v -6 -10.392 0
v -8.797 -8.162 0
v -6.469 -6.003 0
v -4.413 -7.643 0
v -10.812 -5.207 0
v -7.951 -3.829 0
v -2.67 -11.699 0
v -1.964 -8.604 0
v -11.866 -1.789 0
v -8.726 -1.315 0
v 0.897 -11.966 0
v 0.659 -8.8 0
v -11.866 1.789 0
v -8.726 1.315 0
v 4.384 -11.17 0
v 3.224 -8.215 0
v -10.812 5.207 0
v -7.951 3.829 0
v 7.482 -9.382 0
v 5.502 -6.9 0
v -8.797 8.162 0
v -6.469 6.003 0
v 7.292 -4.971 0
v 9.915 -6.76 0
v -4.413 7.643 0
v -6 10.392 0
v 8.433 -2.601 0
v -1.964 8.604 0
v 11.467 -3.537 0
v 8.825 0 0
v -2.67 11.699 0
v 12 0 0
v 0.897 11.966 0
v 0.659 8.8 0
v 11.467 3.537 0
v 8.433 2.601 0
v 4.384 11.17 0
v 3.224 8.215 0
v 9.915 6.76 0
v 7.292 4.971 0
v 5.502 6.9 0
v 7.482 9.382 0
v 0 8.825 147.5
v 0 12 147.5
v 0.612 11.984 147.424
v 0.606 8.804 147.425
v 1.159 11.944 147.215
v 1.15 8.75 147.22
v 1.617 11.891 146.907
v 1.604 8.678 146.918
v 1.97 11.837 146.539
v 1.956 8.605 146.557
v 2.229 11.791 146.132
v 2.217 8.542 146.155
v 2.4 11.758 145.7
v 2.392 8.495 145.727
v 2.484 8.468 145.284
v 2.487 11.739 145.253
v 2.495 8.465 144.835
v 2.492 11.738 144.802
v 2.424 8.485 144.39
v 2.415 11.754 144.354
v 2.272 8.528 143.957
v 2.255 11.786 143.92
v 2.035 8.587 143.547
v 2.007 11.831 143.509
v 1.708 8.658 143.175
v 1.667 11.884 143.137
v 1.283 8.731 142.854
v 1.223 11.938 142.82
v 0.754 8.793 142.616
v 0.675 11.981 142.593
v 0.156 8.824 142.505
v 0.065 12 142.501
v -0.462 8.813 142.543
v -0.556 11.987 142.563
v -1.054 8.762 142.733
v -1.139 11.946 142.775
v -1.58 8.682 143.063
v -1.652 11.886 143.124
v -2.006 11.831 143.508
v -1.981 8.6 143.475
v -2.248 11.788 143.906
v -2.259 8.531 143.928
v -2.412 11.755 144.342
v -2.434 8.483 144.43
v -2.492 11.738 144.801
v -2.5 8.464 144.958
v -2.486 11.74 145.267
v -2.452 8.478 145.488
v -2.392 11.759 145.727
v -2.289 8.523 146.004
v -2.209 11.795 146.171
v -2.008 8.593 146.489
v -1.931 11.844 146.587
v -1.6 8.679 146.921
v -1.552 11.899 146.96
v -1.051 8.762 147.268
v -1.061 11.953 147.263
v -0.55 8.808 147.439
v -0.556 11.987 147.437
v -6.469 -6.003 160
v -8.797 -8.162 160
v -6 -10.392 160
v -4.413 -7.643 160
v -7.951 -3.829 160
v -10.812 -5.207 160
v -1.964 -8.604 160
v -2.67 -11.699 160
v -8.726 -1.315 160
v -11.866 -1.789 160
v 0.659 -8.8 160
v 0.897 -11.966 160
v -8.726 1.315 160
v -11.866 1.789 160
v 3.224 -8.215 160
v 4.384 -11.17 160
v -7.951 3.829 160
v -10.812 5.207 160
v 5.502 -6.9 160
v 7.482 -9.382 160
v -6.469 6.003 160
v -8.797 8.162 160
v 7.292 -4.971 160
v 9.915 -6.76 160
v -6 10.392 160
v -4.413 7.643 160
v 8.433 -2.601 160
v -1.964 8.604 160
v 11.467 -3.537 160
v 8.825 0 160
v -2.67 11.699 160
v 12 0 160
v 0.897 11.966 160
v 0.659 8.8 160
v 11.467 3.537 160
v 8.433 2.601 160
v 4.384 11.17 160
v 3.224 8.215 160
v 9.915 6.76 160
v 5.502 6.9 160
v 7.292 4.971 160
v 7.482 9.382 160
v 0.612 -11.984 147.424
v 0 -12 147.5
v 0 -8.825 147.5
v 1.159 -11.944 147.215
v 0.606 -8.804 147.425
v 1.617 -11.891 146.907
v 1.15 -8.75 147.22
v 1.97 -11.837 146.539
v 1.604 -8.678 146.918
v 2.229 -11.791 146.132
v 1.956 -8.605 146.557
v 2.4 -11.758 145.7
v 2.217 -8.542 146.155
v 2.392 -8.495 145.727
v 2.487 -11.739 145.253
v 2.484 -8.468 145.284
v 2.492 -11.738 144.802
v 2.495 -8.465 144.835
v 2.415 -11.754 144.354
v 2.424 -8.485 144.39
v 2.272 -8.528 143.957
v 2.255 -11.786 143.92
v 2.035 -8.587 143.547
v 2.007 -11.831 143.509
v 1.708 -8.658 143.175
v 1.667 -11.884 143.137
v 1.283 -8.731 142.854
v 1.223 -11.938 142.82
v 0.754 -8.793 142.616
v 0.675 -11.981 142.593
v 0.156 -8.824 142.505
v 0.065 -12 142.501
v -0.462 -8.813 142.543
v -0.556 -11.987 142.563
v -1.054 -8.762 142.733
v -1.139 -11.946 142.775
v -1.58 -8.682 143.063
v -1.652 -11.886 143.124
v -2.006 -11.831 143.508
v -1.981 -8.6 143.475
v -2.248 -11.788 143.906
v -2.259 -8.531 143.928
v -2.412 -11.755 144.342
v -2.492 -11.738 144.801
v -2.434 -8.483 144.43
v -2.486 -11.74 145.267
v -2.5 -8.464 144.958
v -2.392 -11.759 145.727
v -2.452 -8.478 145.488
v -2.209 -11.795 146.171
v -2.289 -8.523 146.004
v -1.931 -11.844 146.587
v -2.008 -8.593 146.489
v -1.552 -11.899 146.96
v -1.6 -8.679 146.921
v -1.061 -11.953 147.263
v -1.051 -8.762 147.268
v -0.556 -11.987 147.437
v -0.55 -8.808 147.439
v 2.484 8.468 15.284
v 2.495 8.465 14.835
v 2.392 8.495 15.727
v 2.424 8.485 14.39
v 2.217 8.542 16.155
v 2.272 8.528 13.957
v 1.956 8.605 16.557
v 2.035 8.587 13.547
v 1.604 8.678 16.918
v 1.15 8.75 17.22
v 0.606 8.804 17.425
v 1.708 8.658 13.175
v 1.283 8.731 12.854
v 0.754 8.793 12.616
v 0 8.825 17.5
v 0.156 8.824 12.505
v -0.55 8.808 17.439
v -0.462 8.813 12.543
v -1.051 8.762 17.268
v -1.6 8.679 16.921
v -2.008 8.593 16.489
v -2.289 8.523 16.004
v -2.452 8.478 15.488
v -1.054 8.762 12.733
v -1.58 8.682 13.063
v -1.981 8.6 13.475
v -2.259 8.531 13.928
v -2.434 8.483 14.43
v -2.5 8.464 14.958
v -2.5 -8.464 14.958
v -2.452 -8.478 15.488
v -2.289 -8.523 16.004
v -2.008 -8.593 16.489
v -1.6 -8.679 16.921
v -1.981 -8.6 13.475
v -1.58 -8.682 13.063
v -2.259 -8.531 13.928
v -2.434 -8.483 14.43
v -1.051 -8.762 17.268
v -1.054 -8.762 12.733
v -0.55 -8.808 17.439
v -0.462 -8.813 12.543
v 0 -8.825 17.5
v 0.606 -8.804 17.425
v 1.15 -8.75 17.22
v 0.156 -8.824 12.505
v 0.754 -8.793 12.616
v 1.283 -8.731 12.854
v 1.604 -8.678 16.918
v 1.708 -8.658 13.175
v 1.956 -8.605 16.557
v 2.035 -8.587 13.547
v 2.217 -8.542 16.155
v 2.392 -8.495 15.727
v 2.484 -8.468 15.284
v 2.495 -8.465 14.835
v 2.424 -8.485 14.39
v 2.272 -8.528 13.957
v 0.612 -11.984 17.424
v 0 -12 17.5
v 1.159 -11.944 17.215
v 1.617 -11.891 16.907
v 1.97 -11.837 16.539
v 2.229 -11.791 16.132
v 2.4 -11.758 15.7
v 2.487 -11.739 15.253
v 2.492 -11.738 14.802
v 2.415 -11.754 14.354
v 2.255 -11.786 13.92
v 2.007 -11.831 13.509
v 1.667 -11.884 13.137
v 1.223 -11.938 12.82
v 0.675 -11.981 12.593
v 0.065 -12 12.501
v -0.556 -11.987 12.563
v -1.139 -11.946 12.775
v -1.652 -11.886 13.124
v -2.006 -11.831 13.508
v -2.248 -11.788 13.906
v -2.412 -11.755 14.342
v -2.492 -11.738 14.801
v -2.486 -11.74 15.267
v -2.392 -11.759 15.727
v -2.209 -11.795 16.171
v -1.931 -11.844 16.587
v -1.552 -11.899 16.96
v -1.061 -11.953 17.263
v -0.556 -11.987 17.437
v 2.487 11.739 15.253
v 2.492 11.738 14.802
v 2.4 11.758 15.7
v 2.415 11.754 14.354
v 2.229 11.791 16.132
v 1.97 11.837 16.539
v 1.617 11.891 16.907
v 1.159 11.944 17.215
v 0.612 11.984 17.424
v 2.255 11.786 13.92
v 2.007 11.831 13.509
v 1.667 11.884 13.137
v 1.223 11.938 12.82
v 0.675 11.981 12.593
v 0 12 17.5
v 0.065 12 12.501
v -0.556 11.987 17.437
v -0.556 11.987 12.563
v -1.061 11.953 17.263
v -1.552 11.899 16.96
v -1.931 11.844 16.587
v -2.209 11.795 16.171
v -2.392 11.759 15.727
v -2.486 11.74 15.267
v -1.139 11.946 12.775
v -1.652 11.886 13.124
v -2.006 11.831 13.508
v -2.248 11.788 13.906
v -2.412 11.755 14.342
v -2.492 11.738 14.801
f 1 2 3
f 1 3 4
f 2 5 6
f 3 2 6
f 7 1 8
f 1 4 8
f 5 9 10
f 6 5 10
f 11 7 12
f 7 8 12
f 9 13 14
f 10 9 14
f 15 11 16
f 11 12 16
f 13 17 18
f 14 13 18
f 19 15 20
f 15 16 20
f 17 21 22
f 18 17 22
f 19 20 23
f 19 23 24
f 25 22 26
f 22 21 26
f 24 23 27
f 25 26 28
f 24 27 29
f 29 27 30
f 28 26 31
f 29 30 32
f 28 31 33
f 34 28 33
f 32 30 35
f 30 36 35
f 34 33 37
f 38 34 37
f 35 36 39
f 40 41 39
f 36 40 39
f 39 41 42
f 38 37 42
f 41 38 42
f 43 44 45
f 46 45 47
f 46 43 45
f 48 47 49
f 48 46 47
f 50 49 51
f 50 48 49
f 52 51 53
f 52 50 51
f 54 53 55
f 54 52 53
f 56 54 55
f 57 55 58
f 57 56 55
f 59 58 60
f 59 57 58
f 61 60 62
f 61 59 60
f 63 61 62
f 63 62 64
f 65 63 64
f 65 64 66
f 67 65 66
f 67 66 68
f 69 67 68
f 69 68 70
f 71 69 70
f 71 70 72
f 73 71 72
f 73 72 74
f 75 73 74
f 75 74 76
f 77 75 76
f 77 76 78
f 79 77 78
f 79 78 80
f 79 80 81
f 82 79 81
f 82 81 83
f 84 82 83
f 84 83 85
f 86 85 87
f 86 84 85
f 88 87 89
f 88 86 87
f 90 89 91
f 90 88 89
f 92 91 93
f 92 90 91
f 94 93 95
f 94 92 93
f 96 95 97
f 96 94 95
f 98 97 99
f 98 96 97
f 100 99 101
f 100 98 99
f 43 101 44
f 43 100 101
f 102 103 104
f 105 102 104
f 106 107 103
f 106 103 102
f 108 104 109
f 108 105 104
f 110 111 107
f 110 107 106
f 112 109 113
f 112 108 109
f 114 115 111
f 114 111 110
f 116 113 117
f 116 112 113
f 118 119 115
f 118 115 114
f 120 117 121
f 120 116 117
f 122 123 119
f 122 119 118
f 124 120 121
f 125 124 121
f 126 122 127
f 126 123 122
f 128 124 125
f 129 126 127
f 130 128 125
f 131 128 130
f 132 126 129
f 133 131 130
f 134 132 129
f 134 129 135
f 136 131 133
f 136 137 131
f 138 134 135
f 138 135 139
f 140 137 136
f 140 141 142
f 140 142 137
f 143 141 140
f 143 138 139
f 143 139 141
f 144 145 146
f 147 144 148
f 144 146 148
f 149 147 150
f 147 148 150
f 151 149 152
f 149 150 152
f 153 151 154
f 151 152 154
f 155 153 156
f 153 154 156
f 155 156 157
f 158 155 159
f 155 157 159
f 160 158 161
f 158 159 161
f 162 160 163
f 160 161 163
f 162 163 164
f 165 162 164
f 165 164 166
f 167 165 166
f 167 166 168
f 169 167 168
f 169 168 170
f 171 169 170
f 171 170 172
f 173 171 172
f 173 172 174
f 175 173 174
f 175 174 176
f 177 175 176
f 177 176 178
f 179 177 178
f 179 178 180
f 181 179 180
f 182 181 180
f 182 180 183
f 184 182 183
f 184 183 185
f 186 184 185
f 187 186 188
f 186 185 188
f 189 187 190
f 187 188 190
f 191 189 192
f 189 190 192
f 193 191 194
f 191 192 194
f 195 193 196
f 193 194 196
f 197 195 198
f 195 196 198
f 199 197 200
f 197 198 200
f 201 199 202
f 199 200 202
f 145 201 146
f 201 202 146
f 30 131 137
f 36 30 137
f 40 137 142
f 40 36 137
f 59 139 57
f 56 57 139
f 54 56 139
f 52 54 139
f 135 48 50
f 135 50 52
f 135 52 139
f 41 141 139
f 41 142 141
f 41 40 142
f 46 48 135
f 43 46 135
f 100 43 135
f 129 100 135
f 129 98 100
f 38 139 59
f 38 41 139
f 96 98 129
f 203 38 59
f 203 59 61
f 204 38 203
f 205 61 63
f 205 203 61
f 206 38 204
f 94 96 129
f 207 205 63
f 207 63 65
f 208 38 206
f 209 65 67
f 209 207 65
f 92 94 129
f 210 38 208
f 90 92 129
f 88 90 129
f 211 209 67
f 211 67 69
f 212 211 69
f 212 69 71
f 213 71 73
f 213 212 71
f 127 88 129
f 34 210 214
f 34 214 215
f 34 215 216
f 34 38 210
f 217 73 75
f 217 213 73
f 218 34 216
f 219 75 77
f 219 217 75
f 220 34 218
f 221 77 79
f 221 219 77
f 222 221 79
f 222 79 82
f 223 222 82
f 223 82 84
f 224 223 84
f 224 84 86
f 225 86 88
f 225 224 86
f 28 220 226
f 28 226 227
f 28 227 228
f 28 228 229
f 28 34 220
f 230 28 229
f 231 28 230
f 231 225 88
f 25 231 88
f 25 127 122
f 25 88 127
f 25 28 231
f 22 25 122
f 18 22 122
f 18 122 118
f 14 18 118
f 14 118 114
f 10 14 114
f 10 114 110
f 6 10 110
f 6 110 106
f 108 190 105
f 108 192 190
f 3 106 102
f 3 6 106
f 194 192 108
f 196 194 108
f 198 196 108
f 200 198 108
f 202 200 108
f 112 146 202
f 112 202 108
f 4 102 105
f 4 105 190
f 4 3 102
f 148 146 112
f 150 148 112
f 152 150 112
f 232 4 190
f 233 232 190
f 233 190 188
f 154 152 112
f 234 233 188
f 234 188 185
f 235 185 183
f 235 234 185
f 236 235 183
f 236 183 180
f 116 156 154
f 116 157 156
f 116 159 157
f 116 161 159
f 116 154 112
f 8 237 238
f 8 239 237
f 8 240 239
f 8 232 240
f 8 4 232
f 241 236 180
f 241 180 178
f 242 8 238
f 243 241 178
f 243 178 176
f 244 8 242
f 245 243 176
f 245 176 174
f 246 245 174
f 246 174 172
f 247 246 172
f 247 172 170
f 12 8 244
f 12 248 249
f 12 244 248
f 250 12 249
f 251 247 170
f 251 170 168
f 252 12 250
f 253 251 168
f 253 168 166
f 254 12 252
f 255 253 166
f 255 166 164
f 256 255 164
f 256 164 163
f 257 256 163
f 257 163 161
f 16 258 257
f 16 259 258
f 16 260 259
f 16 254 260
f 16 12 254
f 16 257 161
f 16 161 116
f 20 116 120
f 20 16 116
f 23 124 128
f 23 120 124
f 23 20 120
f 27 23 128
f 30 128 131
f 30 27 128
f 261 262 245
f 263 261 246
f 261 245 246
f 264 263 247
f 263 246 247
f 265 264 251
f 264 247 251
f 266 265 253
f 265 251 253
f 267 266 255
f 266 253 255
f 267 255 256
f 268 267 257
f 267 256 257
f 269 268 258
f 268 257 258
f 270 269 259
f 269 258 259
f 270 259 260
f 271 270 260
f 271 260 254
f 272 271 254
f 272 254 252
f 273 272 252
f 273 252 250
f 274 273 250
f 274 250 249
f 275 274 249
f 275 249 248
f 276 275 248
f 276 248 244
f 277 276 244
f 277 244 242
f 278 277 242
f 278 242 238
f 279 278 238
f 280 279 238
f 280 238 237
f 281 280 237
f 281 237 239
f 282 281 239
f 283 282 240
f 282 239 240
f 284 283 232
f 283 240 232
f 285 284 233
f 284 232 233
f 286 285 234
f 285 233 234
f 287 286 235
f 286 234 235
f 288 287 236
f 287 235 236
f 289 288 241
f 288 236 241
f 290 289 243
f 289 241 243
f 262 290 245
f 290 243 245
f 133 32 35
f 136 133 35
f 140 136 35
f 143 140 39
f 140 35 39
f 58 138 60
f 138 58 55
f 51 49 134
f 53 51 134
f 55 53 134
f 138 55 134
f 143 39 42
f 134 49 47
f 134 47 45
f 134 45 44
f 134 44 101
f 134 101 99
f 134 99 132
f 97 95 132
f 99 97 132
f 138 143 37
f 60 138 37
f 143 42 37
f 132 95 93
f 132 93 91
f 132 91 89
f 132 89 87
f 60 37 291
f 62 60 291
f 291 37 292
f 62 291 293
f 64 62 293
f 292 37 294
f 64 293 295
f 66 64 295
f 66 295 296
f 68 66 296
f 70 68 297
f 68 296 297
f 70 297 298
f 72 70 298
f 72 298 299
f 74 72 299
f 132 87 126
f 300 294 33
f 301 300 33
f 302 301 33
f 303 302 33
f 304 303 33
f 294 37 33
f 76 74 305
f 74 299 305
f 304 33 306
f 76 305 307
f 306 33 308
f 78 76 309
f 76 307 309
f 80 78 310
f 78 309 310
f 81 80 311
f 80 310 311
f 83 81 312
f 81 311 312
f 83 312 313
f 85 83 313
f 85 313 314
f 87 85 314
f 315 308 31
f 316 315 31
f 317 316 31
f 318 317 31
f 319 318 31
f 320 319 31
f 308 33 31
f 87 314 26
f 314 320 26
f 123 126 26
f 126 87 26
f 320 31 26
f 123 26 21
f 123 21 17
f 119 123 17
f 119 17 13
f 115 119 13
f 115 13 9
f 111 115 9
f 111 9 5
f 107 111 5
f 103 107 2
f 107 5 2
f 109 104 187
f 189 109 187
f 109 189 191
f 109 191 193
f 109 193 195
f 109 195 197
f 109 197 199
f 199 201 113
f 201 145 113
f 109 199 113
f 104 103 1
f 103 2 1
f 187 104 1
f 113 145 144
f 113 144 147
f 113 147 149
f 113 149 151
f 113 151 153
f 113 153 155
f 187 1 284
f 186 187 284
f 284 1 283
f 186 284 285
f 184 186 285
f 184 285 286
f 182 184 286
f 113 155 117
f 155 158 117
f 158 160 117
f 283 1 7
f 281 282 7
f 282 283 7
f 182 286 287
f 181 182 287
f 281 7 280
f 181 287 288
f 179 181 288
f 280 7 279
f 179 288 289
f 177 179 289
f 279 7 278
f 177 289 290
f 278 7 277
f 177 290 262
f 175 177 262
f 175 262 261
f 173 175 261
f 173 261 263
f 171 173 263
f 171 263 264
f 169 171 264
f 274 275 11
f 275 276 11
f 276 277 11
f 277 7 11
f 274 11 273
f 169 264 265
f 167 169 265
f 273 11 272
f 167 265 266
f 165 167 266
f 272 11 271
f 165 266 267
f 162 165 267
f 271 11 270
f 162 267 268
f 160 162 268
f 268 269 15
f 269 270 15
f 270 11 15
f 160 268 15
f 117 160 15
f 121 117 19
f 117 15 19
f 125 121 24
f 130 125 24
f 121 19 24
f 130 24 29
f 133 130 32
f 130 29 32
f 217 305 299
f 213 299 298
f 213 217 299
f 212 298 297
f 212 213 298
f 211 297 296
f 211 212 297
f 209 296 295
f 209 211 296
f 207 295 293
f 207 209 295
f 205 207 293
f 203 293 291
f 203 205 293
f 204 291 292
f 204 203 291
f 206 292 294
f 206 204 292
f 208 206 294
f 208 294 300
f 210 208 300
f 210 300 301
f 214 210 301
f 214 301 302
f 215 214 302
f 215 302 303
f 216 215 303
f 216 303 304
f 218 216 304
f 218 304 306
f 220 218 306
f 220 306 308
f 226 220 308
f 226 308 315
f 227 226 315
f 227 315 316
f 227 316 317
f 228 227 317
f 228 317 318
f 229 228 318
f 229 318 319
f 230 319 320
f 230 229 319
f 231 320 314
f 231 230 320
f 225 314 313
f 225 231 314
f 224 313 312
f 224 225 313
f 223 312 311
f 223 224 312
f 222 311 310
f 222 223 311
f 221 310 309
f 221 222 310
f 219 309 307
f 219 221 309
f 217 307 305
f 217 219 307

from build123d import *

# Parameters (mm, degrees)
SKETCH1_R               = 12
BOSS_EXTRUDE1_DEPTH     = 160
SHELL1_T                = -3.175
SKETCH2_R               = 2.5
CUT_EXTRUDE1_DEPTH      = 161.897482889
CUT_EXTRUDE1_DEPTH_BACK = 161.897482889


with BuildPart() as part:
    # Sketch1 → Boss-Extrude1 (new body)
    with BuildSketch(Plane.XY):
        Circle(SKETCH1_R)
    extrude(amount=BOSS_EXTRUDE1_DEPTH)

    # Shell1
    shell1_openings = [part.faces().sort_by_distance(p)[0] for p in [
        (0, 0, 160),
        (0, 0, 0),
    ]]
    offset(amount=SHELL1_T, openings=shell1_openings, kind=Kind.INTERSECTION)

    # Sketch2 → Cut-Extrude1 (cut, two sides)
    with BuildSketch(Plane(origin=(0, 0, 0), x_dir=(1, 0, 0), z_dir=(0, 1, 0))) as cut_extrude1_sk:
        with Locations(Location((0, -15, 0), (0, 0, 270))):
            Circle(SKETCH2_R)
        with Locations(Location((0, -145, 0), (0, 0, 270))):
            Circle(SKETCH2_R)
    extrude(amount=CUT_EXTRUDE1_DEPTH, mode=Mode.SUBTRACT)
    extrude(cut_extrude1_sk.sketch, amount=-CUT_EXTRUDE1_DEPTH_BACK, mode=Mode.SUBTRACT)


solid = part.part
